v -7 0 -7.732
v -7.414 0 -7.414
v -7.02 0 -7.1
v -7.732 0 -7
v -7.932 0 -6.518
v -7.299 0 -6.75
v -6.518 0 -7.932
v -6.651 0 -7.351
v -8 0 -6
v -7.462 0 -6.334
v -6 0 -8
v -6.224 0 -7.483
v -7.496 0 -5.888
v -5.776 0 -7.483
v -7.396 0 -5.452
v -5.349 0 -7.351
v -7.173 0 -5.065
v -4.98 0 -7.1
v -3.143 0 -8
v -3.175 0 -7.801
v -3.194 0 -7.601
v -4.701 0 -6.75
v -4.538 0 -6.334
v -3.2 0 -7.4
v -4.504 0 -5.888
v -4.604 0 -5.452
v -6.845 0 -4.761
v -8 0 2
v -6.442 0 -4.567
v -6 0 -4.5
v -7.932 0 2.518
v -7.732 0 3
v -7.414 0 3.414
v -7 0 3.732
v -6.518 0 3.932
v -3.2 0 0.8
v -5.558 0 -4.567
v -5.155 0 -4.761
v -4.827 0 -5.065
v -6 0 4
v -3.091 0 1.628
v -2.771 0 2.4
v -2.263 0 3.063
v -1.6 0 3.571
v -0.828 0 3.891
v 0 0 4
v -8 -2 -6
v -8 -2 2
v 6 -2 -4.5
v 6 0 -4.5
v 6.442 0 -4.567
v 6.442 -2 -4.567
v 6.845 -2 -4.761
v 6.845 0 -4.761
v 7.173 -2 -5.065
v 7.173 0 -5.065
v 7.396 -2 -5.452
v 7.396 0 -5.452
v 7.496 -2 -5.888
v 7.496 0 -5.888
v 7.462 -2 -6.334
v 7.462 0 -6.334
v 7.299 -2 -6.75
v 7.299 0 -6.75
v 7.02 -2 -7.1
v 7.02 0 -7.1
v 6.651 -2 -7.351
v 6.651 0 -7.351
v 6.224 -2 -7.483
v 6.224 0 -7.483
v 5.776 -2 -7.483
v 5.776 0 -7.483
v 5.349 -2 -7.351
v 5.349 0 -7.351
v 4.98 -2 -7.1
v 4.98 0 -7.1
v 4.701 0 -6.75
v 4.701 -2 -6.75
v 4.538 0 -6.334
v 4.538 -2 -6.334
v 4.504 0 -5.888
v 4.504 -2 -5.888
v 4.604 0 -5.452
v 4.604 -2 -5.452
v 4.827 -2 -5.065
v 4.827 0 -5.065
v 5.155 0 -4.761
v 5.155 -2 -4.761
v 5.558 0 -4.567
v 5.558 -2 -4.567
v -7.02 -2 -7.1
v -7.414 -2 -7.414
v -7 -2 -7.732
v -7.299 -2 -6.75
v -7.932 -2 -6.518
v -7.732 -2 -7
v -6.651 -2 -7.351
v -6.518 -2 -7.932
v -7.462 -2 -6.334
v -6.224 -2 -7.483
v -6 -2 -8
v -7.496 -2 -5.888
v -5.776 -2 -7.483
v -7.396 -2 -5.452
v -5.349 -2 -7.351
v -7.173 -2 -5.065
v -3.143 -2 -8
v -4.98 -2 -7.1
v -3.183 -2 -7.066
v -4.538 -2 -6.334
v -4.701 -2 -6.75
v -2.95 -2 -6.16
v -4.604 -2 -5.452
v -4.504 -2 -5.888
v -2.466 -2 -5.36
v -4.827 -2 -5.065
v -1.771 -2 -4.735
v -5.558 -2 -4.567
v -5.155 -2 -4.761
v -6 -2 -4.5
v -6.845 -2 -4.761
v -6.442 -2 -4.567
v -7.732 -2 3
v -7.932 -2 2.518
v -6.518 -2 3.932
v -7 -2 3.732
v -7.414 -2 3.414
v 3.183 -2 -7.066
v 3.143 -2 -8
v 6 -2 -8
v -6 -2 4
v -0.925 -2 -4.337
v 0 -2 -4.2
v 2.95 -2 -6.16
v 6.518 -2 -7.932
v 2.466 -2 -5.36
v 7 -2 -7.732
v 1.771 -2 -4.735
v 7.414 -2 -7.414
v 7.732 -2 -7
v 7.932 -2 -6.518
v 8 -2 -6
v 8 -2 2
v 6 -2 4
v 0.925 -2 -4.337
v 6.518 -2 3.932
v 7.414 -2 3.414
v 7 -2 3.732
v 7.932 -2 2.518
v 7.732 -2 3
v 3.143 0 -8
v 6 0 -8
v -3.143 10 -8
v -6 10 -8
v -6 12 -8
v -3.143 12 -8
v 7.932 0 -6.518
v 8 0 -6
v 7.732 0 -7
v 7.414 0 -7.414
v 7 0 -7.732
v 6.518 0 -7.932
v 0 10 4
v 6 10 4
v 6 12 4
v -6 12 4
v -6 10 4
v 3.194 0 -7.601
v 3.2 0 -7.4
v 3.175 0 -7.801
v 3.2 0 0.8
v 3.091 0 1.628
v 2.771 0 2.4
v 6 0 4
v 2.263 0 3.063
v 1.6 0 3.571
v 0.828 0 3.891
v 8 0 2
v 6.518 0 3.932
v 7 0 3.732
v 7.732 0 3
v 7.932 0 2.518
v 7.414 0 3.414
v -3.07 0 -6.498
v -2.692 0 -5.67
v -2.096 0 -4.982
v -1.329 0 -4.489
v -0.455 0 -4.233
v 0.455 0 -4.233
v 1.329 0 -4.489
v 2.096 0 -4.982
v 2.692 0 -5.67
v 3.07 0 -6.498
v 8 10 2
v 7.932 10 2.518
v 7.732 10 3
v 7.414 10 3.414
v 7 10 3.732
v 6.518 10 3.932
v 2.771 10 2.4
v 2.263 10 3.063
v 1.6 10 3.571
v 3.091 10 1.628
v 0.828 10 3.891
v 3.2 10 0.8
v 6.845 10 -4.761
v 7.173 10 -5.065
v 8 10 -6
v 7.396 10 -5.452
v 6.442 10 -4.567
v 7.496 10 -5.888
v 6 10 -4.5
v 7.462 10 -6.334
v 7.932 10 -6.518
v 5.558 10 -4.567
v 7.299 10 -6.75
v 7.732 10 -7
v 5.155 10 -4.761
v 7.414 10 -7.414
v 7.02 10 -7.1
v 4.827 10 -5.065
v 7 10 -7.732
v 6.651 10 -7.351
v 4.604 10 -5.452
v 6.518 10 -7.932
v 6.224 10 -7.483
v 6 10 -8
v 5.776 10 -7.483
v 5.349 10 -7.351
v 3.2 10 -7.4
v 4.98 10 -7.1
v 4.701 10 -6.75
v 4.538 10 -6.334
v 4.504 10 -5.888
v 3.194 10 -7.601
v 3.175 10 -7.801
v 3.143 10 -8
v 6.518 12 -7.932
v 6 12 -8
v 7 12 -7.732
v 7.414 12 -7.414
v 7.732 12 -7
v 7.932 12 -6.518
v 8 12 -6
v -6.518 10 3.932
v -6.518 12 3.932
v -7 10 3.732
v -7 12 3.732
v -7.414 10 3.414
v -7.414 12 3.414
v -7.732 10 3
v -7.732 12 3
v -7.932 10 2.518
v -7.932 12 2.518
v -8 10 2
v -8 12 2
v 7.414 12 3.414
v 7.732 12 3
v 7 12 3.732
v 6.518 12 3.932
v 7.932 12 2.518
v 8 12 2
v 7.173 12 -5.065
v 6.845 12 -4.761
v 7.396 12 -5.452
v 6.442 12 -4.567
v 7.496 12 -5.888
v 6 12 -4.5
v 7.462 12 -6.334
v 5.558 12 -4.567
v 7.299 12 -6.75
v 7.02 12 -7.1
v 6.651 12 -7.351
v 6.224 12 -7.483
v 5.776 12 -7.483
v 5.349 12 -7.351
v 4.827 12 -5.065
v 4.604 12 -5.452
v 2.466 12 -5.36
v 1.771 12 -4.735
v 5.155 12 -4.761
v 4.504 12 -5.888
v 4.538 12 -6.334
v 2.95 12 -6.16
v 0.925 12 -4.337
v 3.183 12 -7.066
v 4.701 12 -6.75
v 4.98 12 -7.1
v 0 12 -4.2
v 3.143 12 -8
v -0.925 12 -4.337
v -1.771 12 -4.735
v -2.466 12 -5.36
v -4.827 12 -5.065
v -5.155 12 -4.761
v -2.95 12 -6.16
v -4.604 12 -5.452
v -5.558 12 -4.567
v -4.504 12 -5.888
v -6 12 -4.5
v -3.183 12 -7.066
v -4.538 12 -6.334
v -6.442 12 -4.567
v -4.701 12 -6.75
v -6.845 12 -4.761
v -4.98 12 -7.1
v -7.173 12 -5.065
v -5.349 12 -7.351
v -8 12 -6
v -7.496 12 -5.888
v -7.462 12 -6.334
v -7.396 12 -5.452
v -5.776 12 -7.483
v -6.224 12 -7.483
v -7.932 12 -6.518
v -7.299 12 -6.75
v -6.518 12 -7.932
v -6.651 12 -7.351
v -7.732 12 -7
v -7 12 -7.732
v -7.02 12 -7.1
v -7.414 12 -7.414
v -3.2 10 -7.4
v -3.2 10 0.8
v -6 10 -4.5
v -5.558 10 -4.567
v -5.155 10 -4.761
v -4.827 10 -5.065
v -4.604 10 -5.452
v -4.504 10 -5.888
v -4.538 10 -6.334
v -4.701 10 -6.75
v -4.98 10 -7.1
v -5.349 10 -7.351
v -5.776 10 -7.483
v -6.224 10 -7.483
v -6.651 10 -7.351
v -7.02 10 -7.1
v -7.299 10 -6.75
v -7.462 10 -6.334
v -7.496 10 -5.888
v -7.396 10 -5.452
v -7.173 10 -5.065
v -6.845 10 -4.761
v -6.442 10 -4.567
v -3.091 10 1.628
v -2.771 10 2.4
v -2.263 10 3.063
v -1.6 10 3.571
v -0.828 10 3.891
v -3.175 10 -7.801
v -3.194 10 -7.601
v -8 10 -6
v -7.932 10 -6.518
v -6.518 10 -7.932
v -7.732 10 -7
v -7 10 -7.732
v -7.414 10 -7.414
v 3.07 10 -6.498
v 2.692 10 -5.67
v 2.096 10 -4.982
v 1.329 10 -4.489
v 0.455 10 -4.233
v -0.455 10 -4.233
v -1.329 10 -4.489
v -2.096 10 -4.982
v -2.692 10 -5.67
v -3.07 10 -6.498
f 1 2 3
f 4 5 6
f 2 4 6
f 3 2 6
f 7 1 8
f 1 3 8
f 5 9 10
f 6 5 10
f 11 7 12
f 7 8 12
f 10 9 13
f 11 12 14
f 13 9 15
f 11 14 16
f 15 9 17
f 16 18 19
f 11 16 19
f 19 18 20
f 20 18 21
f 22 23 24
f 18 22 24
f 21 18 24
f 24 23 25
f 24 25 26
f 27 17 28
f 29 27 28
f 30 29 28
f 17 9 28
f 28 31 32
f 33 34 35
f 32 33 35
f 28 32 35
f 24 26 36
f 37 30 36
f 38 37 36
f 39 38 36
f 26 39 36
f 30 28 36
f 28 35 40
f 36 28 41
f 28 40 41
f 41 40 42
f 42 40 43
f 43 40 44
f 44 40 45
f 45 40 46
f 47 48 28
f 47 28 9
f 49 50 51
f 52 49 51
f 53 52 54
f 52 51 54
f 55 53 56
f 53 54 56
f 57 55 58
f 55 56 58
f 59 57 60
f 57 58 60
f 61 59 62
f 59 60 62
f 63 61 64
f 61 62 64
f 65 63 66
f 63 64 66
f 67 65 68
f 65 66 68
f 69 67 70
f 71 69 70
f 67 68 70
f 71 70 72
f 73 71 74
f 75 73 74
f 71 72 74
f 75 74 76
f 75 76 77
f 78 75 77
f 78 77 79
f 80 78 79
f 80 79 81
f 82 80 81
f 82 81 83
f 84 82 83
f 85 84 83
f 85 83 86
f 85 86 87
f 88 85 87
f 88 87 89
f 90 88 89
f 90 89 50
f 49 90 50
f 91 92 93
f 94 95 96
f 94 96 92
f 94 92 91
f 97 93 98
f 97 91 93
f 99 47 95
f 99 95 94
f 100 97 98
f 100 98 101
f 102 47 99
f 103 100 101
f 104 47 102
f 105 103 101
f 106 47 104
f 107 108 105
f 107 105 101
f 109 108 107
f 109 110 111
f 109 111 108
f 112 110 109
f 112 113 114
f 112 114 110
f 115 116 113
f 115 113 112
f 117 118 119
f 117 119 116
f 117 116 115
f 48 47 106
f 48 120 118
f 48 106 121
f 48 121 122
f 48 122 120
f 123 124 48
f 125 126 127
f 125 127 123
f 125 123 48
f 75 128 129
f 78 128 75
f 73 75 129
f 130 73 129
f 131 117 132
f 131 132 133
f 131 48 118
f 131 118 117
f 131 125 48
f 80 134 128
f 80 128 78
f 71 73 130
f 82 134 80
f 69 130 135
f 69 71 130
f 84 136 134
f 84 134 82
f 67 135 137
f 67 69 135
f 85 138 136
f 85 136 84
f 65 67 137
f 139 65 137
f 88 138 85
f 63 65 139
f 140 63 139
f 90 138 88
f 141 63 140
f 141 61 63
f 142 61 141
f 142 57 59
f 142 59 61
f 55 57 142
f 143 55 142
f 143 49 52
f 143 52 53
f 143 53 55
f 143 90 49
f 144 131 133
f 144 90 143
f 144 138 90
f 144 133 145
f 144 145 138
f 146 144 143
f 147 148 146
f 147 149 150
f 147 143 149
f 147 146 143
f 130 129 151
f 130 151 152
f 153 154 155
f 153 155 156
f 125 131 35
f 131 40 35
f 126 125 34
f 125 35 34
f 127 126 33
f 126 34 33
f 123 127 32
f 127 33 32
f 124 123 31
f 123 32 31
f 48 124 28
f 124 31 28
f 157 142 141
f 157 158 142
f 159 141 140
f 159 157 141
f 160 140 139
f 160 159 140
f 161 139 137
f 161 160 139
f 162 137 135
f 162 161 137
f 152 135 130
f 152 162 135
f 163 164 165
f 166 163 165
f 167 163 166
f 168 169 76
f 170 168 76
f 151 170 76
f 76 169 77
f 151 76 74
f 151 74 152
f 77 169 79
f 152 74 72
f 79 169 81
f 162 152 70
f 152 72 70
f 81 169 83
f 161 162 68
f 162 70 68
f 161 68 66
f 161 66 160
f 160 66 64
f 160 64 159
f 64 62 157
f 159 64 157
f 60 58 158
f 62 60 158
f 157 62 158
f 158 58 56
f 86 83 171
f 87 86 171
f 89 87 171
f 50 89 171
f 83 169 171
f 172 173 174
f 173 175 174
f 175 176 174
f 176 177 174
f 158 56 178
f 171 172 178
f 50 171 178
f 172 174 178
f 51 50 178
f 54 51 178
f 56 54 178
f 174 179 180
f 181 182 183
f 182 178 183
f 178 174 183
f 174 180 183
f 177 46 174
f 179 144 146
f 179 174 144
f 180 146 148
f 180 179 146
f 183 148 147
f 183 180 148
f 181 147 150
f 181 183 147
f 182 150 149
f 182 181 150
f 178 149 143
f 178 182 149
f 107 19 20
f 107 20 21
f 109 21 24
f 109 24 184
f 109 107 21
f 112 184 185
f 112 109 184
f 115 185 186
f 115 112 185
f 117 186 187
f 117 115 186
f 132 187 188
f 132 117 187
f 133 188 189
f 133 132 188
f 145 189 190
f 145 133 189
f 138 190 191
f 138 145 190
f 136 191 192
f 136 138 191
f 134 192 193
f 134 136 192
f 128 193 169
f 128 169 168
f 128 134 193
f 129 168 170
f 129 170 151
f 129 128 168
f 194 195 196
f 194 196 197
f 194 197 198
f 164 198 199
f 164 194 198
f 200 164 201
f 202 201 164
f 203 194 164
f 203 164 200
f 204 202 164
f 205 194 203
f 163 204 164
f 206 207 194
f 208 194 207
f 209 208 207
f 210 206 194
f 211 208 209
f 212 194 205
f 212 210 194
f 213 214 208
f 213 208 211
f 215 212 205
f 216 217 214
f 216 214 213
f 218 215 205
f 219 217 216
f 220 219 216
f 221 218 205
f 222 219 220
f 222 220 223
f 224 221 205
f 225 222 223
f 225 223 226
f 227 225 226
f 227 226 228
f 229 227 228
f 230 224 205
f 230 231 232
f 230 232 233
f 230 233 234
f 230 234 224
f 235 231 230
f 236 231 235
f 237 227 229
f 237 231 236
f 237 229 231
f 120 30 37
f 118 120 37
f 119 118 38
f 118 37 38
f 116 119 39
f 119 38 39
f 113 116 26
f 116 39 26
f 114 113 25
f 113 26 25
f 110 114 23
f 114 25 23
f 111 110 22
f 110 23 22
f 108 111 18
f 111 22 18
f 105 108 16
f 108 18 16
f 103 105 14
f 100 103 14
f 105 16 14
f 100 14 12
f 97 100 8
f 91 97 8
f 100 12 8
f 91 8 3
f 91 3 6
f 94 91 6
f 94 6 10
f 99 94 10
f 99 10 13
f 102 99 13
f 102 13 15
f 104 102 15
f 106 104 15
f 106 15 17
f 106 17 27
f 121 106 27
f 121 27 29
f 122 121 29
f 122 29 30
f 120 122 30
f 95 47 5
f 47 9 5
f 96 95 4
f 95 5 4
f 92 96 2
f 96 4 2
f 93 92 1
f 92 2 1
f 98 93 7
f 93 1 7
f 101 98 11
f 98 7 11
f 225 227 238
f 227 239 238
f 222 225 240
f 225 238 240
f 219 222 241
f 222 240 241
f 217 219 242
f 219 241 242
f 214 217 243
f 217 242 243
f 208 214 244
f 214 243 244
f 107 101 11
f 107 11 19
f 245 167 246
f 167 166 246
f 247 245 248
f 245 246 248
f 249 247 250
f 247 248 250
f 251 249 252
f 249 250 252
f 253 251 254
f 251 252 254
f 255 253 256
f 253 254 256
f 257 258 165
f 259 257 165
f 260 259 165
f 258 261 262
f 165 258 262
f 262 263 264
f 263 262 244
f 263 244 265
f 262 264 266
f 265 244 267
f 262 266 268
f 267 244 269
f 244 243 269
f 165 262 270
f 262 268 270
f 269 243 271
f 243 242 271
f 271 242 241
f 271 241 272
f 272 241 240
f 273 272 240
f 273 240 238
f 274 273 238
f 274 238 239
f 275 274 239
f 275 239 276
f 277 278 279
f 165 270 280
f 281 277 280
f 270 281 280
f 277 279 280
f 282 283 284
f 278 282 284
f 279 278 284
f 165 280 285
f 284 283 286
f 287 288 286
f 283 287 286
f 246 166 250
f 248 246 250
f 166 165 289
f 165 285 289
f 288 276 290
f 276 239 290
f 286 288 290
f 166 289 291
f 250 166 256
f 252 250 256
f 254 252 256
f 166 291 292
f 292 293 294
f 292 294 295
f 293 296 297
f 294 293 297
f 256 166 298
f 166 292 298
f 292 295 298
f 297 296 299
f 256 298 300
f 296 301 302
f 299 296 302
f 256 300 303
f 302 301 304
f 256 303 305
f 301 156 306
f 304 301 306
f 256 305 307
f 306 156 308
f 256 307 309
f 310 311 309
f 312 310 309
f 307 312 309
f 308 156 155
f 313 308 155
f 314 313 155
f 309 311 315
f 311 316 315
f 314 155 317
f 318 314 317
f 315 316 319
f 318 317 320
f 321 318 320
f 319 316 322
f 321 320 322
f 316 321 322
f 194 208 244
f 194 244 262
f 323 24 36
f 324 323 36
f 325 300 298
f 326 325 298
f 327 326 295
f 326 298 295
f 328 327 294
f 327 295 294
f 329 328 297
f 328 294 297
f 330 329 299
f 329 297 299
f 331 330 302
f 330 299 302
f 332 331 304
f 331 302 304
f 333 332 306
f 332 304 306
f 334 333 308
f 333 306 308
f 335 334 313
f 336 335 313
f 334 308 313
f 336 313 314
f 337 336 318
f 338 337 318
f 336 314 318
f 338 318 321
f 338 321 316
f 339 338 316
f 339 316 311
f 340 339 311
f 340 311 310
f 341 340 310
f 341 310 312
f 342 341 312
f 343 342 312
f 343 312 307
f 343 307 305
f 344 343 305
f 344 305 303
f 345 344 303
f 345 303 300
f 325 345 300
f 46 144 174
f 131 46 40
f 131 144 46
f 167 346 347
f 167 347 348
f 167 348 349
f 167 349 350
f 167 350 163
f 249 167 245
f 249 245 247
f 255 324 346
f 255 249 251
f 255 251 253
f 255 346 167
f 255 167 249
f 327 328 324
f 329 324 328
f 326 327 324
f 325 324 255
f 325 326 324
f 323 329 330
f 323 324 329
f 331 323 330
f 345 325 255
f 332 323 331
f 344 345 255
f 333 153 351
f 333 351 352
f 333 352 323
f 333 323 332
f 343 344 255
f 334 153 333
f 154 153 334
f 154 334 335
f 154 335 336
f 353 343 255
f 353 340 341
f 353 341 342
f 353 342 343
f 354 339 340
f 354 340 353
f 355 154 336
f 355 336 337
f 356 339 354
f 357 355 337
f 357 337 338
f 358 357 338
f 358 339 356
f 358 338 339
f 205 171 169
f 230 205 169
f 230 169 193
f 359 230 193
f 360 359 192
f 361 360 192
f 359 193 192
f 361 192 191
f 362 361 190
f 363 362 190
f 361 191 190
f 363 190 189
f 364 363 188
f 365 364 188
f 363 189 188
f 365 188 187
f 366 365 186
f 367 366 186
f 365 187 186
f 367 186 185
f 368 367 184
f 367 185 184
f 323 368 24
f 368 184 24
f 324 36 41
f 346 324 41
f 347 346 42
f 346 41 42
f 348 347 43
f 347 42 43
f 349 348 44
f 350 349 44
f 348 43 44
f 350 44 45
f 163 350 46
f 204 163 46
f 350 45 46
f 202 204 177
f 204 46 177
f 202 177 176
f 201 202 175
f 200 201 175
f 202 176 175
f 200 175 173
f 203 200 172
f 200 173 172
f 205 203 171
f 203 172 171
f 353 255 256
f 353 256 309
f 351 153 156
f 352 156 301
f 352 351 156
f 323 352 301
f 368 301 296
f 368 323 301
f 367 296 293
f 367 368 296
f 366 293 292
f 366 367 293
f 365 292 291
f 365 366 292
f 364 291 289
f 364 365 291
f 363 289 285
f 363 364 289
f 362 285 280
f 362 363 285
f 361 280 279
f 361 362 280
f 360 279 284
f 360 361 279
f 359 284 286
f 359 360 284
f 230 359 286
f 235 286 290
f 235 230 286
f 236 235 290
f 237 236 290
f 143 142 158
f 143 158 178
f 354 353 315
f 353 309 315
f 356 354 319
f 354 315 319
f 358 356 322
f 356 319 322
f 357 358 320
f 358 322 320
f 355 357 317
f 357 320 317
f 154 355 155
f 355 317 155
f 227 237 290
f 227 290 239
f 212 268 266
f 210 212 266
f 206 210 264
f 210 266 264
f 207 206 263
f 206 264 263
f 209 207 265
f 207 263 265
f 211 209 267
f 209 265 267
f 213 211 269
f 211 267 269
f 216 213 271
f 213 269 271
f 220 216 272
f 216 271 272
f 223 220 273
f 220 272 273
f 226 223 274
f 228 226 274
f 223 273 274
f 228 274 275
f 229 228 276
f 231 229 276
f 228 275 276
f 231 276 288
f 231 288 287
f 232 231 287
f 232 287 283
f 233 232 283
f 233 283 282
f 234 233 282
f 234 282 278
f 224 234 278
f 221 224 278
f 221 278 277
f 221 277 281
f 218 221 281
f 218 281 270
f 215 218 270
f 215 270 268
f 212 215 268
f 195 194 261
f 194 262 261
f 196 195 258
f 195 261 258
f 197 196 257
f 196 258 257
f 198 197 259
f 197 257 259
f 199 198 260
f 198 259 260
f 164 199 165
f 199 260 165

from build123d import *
from build123d.topology import SkipClean

# Parameters (mm, degrees)
BOSS_EXTRUDE1_DEPTH = 10
BOSS_EXTRUDE2_DEPTH = 2
FILLET1_R           = 3.2
BOSS_EXTRUDE4_START = 2
BOSS_EXTRUDE4_DEPTH = 2
FILLET3_R           = 2
SKETCH5_R           = 1.5
CUT_EXTRUDE1_DEPTH  = 14


with BuildPart() as part:
    # Sketch1 → Boss-Extrude1 (new body)
    with BuildSketch(Plane(origin=(0, 0, 0), x_dir=(1, 0, 0), z_dir=(0, 1, 0))):
        with BuildLine():
            Line((-3.2, 7.4), (-3.2, 4))
            Line((-3.2, 4), (-3.2, -4))
            Line((-3.2, -4), (3.2, -4))
            Line((3.2, -4), (3.2, 4))
            Line((3.2, 4), (3.2, 7.4))
            ThreePointArc((3.2, 7.4), (0, 4.2), (-3.2, 7.4))
        make_face()
    extrude(amount=BOSS_EXTRUDE1_DEPTH)

    # Sketch2 → Boss-Extrude2 (add)
    with SkipClean():  # the faces are left unmerged after this step: merging them gives an invalid solid
        with BuildSketch(Plane(origin=(0, 10, 0), x_dir=(1, 0, 0), z_dir=(0, 1, 0))):
            with BuildLine():
                Line((-8, 8), (-3.143246729, 8))
                ThreePointArc((-3.143246729, 8), (0, 4.2), (3.143246729, 8))
                Line((3.143246729, 8), (8, 8))
                Line((8, 8), (8, -4))
                Line((8, -4), (-8, -4))
                Line((-8, -4), (-8, 8))
            make_face()
        extrude(amount=BOSS_EXTRUDE2_DEPTH)

    # Fillet1
    # the kernel refuses this fillet: 3.2 mm, written as the material it takes off along each edge
    with BuildSketch(Plane(origin=(-3.2, -8, 4), x_dir=(0, 0, -1), z_dir=(0, 1, 0)), Plane(origin=(3.2, -8, 4), x_dir=(-1, 0, 0), z_dir=(0, 1, 0))) as fillet1_piece_1:
        with BuildLine():
            CenterArc((FILLET1_R, -FILLET1_R), FILLET1_R, 90, 90)
            Line((0, -FILLET1_R), (0, 0))
            Line((0, 0), (FILLET1_R, 0))
        make_face()
    extrude(amount=18, mode=Mode.SUBTRACT)

    # Sketch3 → Boss-Extrude4 (add)
    with SkipClean():  # the faces are left unmerged after this step: merging them gives an invalid solid
        with BuildSketch(Plane.XZ.offset(BOSS_EXTRUDE4_START)):
            with BuildLine():
                Line((8, 4), (-8, 4))
                Line((-8, 4), (-8, -8))
                Line((-8, -8), (-3.143246729, -8))
                ThreePointArc((-3.143246729, -8), (0, -4.2), (3.143246729, -8))
                Line((3.143246729, -8), (8, -8))
                Line((8, -8), (8, 4))
            make_face()
        extrude(amount=-BOSS_EXTRUDE4_DEPTH)

    # Fillet3
    fillet3_edges = [part.edges().sort_by_distance(p)[0] for p in [
        (-8, 11, -8),
        (-8, 11, 4),
        (8, 11, 4),
        (8, 11, -8),
        (8, -1, -8),
        (8, -1, 4),
        (-8, -1, 4),
        (-8, -1, -8),
    ]]
    fillet(fillet3_edges, radius=FILLET3_R)

    # Sketch5 → Cut-Extrude1 (cut)
    with SkipClean():  # the faces are left unmerged after this step: merging them gives an invalid solid
        with BuildSketch(Plane(origin=(0, 12, 0), x_dir=(1, 0, 0), z_dir=(0, 1, 0))):
            with Locations(Location((-6, 6, 0), (0, 0, 270))):
                Circle(SKETCH5_R)
            with Locations(Location((6, 6, 0), (0, 0, 270))):
                Circle(SKETCH5_R)
        extrude(amount=-CUT_EXTRUDE1_DEPTH, mode=Mode.SUBTRACT)


solid = part.part
